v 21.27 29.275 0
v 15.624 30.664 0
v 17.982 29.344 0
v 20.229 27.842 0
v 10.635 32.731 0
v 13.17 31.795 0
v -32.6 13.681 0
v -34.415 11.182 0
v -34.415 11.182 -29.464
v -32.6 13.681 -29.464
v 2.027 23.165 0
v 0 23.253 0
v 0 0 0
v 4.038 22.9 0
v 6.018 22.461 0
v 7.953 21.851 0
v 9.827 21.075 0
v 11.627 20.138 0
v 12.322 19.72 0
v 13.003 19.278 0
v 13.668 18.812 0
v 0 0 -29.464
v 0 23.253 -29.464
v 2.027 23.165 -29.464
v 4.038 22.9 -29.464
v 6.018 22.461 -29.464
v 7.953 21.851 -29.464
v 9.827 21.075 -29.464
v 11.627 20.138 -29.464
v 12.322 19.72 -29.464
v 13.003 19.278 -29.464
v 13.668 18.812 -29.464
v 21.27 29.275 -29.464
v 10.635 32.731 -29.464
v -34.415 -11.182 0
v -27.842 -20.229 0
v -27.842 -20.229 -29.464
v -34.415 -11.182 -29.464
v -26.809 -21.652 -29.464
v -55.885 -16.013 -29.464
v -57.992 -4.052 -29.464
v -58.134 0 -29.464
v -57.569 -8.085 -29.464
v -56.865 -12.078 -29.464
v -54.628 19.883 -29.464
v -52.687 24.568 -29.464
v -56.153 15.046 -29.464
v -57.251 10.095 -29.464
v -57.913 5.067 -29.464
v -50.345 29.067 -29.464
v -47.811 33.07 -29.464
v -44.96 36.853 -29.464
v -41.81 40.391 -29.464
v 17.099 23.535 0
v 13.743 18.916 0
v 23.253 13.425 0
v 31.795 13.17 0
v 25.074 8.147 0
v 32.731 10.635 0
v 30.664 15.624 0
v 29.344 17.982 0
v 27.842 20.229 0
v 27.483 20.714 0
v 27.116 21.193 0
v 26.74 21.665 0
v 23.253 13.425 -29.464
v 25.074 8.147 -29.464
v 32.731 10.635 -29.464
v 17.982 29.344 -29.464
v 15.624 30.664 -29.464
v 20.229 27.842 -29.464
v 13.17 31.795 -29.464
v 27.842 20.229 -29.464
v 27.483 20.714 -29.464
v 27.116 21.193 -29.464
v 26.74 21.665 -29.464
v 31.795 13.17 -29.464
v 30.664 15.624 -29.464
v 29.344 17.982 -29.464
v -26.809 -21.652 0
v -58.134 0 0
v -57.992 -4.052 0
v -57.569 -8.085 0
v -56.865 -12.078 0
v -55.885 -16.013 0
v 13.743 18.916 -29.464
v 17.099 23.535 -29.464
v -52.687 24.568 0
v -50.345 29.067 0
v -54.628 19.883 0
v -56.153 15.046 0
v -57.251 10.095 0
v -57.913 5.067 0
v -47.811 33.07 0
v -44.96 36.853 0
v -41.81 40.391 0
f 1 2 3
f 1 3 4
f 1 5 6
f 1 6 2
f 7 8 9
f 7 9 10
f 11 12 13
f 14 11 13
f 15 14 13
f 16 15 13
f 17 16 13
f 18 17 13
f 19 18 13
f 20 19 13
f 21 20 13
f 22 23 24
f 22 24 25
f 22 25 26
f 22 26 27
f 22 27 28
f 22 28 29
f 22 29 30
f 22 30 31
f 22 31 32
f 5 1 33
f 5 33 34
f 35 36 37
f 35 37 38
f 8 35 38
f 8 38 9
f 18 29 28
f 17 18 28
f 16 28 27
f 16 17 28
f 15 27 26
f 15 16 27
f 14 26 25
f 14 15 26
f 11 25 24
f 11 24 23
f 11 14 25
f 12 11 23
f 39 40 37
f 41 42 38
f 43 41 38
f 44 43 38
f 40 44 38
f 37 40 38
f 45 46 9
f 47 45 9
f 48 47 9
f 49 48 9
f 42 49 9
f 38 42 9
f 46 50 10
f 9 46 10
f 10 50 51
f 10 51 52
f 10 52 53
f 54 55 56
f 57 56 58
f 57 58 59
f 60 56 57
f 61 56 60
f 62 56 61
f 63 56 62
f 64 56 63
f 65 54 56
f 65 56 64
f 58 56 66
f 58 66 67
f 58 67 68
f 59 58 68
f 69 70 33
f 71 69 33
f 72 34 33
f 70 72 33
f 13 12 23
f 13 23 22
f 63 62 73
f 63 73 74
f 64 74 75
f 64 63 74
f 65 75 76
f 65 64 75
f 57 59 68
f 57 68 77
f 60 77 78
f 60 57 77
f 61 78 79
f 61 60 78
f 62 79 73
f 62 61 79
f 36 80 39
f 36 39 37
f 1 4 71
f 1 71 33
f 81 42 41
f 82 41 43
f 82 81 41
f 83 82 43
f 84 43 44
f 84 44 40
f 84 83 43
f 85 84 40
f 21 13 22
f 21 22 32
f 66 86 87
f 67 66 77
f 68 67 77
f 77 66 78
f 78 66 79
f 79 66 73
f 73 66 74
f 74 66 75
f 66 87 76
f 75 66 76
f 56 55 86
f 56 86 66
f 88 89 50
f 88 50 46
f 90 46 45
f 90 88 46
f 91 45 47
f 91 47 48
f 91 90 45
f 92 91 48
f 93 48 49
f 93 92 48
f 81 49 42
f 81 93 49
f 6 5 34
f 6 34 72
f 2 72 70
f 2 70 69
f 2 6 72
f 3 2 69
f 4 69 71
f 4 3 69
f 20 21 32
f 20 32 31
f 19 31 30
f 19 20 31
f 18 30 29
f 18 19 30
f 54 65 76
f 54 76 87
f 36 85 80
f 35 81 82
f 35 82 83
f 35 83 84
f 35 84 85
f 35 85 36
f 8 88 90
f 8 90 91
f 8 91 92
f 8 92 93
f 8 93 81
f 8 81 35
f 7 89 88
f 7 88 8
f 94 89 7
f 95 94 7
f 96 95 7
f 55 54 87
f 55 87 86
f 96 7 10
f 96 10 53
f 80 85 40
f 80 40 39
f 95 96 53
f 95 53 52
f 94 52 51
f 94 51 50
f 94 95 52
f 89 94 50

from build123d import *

# Parameters (mm, degrees)
F1_DEPTH = 29.464


with BuildPart() as f1:
    # F0 (on Top) → F1 (new body)
    with BuildSketch(Plane.XY):
        with BuildLine():
            Line((-27.8424609945, -20.2287317001), (-34.4151742756, -11.1821679714))
            Line((-34.4151742756, -11.1821679714), (-34.4151742756, 0))
            Line((-34.4151742756, 0), (-34.4151742756, 11.1821679714))
            Line((-34.4151742756, 11.1821679714), (-32.5999693498, 13.6805832133))
            Line((-32.5999693498, 13.6805832133), (-41.8101035376, 40.3911797196))
            ThreePointArc((-41.8101035376, 40.3911797196), (-46.4242881349, 34.9902504726), (-50.3452987514, 29.066872047))
            ThreePointArc((-50.3452987514, 29.066872047), (-56.1528843928, 15.0461201425), (-58.1337437034, 0))
            ThreePointArc((-58.1337437034, 0), (-57.5687723209, -8.085085679), (-55.8848394948, -16.0130219386))
            Line((-55.8848394948, -16.0130219386), (-26.8085263436, -21.6518206605))
            Line((-26.8085263436, -21.6518206605), (-27.8424609945, -20.2287317001))
        make_face()
    extrude(amount=-F1_DEPTH)


with BuildPart() as f1b:
    # F0 (on Top) → F1, piece 2 (new body)
    with BuildSketch(Plane.XY):
        with BuildLine():
            Line((0, 23.2534967363), (0, 0))
            Line((0, 0), (13.6680624458, 18.8124740383))
            ThreePointArc((13.6680624458, 18.8124740383), (12.6647620453, 19.5020233001), (11.6267484139, 20.138118874))
            ThreePointArc((11.6267484139, 20.138118874), (6.0184478461, 22.4611530423), (0, 23.2534967363))
        make_face()
    extrude(amount=-F1_DEPTH)


with BuildPart() as f1c:
    # F0 (on Top) → F1, piece 3 (new body)
    with BuildSketch(Plane.XY):
        with BuildLine():
            Line((17.0990282966, 23.5347934051), (13.7433499549, 18.9160984046))
            Line((13.7433499549, 18.9160984046), (23.2534967363, 13.4254126003))
            Line((23.2534967363, 13.4254126003), (25.0735900906, 8.1469032757))
            Line((25.0735900906, 8.1469032757), (32.7307757543, 10.6348737155))
            ThreePointArc((32.7307757543, 10.6348737155), (30.6641449331, 15.6241619278), (27.8424611703, 20.2287314581))
            ThreePointArc((27.8424611703, 20.2287314581), (27.3006746835, 20.954173385), (26.7399917303, 21.6651116472))
            Line((26.7399917303, 21.6651116472), (17.0990282966, 23.5347934051))
        make_face()
    extrude(amount=-F1_DEPTH)


with BuildPart() as f1d:
    # F0 (on Top) → F1, piece 4 (new body)
    with BuildSketch(Plane.XY):
        with BuildLine():
            ThreePointArc((10.6348743882, 32.7307755357), (15.6241624831, 30.6641446501), (20.2287318943, 27.8424608534))
            Line((20.2287318943, 27.8424608534), (21.2697474311, 29.2752958171))
            Line((21.2697474311, 29.2752958171), (10.6348743882, 32.7307755357))
        make_face()
    extrude(amount=-F1_DEPTH)


solid = Compound([f1.part, f1b.part, f1c.part, f1d.part])
